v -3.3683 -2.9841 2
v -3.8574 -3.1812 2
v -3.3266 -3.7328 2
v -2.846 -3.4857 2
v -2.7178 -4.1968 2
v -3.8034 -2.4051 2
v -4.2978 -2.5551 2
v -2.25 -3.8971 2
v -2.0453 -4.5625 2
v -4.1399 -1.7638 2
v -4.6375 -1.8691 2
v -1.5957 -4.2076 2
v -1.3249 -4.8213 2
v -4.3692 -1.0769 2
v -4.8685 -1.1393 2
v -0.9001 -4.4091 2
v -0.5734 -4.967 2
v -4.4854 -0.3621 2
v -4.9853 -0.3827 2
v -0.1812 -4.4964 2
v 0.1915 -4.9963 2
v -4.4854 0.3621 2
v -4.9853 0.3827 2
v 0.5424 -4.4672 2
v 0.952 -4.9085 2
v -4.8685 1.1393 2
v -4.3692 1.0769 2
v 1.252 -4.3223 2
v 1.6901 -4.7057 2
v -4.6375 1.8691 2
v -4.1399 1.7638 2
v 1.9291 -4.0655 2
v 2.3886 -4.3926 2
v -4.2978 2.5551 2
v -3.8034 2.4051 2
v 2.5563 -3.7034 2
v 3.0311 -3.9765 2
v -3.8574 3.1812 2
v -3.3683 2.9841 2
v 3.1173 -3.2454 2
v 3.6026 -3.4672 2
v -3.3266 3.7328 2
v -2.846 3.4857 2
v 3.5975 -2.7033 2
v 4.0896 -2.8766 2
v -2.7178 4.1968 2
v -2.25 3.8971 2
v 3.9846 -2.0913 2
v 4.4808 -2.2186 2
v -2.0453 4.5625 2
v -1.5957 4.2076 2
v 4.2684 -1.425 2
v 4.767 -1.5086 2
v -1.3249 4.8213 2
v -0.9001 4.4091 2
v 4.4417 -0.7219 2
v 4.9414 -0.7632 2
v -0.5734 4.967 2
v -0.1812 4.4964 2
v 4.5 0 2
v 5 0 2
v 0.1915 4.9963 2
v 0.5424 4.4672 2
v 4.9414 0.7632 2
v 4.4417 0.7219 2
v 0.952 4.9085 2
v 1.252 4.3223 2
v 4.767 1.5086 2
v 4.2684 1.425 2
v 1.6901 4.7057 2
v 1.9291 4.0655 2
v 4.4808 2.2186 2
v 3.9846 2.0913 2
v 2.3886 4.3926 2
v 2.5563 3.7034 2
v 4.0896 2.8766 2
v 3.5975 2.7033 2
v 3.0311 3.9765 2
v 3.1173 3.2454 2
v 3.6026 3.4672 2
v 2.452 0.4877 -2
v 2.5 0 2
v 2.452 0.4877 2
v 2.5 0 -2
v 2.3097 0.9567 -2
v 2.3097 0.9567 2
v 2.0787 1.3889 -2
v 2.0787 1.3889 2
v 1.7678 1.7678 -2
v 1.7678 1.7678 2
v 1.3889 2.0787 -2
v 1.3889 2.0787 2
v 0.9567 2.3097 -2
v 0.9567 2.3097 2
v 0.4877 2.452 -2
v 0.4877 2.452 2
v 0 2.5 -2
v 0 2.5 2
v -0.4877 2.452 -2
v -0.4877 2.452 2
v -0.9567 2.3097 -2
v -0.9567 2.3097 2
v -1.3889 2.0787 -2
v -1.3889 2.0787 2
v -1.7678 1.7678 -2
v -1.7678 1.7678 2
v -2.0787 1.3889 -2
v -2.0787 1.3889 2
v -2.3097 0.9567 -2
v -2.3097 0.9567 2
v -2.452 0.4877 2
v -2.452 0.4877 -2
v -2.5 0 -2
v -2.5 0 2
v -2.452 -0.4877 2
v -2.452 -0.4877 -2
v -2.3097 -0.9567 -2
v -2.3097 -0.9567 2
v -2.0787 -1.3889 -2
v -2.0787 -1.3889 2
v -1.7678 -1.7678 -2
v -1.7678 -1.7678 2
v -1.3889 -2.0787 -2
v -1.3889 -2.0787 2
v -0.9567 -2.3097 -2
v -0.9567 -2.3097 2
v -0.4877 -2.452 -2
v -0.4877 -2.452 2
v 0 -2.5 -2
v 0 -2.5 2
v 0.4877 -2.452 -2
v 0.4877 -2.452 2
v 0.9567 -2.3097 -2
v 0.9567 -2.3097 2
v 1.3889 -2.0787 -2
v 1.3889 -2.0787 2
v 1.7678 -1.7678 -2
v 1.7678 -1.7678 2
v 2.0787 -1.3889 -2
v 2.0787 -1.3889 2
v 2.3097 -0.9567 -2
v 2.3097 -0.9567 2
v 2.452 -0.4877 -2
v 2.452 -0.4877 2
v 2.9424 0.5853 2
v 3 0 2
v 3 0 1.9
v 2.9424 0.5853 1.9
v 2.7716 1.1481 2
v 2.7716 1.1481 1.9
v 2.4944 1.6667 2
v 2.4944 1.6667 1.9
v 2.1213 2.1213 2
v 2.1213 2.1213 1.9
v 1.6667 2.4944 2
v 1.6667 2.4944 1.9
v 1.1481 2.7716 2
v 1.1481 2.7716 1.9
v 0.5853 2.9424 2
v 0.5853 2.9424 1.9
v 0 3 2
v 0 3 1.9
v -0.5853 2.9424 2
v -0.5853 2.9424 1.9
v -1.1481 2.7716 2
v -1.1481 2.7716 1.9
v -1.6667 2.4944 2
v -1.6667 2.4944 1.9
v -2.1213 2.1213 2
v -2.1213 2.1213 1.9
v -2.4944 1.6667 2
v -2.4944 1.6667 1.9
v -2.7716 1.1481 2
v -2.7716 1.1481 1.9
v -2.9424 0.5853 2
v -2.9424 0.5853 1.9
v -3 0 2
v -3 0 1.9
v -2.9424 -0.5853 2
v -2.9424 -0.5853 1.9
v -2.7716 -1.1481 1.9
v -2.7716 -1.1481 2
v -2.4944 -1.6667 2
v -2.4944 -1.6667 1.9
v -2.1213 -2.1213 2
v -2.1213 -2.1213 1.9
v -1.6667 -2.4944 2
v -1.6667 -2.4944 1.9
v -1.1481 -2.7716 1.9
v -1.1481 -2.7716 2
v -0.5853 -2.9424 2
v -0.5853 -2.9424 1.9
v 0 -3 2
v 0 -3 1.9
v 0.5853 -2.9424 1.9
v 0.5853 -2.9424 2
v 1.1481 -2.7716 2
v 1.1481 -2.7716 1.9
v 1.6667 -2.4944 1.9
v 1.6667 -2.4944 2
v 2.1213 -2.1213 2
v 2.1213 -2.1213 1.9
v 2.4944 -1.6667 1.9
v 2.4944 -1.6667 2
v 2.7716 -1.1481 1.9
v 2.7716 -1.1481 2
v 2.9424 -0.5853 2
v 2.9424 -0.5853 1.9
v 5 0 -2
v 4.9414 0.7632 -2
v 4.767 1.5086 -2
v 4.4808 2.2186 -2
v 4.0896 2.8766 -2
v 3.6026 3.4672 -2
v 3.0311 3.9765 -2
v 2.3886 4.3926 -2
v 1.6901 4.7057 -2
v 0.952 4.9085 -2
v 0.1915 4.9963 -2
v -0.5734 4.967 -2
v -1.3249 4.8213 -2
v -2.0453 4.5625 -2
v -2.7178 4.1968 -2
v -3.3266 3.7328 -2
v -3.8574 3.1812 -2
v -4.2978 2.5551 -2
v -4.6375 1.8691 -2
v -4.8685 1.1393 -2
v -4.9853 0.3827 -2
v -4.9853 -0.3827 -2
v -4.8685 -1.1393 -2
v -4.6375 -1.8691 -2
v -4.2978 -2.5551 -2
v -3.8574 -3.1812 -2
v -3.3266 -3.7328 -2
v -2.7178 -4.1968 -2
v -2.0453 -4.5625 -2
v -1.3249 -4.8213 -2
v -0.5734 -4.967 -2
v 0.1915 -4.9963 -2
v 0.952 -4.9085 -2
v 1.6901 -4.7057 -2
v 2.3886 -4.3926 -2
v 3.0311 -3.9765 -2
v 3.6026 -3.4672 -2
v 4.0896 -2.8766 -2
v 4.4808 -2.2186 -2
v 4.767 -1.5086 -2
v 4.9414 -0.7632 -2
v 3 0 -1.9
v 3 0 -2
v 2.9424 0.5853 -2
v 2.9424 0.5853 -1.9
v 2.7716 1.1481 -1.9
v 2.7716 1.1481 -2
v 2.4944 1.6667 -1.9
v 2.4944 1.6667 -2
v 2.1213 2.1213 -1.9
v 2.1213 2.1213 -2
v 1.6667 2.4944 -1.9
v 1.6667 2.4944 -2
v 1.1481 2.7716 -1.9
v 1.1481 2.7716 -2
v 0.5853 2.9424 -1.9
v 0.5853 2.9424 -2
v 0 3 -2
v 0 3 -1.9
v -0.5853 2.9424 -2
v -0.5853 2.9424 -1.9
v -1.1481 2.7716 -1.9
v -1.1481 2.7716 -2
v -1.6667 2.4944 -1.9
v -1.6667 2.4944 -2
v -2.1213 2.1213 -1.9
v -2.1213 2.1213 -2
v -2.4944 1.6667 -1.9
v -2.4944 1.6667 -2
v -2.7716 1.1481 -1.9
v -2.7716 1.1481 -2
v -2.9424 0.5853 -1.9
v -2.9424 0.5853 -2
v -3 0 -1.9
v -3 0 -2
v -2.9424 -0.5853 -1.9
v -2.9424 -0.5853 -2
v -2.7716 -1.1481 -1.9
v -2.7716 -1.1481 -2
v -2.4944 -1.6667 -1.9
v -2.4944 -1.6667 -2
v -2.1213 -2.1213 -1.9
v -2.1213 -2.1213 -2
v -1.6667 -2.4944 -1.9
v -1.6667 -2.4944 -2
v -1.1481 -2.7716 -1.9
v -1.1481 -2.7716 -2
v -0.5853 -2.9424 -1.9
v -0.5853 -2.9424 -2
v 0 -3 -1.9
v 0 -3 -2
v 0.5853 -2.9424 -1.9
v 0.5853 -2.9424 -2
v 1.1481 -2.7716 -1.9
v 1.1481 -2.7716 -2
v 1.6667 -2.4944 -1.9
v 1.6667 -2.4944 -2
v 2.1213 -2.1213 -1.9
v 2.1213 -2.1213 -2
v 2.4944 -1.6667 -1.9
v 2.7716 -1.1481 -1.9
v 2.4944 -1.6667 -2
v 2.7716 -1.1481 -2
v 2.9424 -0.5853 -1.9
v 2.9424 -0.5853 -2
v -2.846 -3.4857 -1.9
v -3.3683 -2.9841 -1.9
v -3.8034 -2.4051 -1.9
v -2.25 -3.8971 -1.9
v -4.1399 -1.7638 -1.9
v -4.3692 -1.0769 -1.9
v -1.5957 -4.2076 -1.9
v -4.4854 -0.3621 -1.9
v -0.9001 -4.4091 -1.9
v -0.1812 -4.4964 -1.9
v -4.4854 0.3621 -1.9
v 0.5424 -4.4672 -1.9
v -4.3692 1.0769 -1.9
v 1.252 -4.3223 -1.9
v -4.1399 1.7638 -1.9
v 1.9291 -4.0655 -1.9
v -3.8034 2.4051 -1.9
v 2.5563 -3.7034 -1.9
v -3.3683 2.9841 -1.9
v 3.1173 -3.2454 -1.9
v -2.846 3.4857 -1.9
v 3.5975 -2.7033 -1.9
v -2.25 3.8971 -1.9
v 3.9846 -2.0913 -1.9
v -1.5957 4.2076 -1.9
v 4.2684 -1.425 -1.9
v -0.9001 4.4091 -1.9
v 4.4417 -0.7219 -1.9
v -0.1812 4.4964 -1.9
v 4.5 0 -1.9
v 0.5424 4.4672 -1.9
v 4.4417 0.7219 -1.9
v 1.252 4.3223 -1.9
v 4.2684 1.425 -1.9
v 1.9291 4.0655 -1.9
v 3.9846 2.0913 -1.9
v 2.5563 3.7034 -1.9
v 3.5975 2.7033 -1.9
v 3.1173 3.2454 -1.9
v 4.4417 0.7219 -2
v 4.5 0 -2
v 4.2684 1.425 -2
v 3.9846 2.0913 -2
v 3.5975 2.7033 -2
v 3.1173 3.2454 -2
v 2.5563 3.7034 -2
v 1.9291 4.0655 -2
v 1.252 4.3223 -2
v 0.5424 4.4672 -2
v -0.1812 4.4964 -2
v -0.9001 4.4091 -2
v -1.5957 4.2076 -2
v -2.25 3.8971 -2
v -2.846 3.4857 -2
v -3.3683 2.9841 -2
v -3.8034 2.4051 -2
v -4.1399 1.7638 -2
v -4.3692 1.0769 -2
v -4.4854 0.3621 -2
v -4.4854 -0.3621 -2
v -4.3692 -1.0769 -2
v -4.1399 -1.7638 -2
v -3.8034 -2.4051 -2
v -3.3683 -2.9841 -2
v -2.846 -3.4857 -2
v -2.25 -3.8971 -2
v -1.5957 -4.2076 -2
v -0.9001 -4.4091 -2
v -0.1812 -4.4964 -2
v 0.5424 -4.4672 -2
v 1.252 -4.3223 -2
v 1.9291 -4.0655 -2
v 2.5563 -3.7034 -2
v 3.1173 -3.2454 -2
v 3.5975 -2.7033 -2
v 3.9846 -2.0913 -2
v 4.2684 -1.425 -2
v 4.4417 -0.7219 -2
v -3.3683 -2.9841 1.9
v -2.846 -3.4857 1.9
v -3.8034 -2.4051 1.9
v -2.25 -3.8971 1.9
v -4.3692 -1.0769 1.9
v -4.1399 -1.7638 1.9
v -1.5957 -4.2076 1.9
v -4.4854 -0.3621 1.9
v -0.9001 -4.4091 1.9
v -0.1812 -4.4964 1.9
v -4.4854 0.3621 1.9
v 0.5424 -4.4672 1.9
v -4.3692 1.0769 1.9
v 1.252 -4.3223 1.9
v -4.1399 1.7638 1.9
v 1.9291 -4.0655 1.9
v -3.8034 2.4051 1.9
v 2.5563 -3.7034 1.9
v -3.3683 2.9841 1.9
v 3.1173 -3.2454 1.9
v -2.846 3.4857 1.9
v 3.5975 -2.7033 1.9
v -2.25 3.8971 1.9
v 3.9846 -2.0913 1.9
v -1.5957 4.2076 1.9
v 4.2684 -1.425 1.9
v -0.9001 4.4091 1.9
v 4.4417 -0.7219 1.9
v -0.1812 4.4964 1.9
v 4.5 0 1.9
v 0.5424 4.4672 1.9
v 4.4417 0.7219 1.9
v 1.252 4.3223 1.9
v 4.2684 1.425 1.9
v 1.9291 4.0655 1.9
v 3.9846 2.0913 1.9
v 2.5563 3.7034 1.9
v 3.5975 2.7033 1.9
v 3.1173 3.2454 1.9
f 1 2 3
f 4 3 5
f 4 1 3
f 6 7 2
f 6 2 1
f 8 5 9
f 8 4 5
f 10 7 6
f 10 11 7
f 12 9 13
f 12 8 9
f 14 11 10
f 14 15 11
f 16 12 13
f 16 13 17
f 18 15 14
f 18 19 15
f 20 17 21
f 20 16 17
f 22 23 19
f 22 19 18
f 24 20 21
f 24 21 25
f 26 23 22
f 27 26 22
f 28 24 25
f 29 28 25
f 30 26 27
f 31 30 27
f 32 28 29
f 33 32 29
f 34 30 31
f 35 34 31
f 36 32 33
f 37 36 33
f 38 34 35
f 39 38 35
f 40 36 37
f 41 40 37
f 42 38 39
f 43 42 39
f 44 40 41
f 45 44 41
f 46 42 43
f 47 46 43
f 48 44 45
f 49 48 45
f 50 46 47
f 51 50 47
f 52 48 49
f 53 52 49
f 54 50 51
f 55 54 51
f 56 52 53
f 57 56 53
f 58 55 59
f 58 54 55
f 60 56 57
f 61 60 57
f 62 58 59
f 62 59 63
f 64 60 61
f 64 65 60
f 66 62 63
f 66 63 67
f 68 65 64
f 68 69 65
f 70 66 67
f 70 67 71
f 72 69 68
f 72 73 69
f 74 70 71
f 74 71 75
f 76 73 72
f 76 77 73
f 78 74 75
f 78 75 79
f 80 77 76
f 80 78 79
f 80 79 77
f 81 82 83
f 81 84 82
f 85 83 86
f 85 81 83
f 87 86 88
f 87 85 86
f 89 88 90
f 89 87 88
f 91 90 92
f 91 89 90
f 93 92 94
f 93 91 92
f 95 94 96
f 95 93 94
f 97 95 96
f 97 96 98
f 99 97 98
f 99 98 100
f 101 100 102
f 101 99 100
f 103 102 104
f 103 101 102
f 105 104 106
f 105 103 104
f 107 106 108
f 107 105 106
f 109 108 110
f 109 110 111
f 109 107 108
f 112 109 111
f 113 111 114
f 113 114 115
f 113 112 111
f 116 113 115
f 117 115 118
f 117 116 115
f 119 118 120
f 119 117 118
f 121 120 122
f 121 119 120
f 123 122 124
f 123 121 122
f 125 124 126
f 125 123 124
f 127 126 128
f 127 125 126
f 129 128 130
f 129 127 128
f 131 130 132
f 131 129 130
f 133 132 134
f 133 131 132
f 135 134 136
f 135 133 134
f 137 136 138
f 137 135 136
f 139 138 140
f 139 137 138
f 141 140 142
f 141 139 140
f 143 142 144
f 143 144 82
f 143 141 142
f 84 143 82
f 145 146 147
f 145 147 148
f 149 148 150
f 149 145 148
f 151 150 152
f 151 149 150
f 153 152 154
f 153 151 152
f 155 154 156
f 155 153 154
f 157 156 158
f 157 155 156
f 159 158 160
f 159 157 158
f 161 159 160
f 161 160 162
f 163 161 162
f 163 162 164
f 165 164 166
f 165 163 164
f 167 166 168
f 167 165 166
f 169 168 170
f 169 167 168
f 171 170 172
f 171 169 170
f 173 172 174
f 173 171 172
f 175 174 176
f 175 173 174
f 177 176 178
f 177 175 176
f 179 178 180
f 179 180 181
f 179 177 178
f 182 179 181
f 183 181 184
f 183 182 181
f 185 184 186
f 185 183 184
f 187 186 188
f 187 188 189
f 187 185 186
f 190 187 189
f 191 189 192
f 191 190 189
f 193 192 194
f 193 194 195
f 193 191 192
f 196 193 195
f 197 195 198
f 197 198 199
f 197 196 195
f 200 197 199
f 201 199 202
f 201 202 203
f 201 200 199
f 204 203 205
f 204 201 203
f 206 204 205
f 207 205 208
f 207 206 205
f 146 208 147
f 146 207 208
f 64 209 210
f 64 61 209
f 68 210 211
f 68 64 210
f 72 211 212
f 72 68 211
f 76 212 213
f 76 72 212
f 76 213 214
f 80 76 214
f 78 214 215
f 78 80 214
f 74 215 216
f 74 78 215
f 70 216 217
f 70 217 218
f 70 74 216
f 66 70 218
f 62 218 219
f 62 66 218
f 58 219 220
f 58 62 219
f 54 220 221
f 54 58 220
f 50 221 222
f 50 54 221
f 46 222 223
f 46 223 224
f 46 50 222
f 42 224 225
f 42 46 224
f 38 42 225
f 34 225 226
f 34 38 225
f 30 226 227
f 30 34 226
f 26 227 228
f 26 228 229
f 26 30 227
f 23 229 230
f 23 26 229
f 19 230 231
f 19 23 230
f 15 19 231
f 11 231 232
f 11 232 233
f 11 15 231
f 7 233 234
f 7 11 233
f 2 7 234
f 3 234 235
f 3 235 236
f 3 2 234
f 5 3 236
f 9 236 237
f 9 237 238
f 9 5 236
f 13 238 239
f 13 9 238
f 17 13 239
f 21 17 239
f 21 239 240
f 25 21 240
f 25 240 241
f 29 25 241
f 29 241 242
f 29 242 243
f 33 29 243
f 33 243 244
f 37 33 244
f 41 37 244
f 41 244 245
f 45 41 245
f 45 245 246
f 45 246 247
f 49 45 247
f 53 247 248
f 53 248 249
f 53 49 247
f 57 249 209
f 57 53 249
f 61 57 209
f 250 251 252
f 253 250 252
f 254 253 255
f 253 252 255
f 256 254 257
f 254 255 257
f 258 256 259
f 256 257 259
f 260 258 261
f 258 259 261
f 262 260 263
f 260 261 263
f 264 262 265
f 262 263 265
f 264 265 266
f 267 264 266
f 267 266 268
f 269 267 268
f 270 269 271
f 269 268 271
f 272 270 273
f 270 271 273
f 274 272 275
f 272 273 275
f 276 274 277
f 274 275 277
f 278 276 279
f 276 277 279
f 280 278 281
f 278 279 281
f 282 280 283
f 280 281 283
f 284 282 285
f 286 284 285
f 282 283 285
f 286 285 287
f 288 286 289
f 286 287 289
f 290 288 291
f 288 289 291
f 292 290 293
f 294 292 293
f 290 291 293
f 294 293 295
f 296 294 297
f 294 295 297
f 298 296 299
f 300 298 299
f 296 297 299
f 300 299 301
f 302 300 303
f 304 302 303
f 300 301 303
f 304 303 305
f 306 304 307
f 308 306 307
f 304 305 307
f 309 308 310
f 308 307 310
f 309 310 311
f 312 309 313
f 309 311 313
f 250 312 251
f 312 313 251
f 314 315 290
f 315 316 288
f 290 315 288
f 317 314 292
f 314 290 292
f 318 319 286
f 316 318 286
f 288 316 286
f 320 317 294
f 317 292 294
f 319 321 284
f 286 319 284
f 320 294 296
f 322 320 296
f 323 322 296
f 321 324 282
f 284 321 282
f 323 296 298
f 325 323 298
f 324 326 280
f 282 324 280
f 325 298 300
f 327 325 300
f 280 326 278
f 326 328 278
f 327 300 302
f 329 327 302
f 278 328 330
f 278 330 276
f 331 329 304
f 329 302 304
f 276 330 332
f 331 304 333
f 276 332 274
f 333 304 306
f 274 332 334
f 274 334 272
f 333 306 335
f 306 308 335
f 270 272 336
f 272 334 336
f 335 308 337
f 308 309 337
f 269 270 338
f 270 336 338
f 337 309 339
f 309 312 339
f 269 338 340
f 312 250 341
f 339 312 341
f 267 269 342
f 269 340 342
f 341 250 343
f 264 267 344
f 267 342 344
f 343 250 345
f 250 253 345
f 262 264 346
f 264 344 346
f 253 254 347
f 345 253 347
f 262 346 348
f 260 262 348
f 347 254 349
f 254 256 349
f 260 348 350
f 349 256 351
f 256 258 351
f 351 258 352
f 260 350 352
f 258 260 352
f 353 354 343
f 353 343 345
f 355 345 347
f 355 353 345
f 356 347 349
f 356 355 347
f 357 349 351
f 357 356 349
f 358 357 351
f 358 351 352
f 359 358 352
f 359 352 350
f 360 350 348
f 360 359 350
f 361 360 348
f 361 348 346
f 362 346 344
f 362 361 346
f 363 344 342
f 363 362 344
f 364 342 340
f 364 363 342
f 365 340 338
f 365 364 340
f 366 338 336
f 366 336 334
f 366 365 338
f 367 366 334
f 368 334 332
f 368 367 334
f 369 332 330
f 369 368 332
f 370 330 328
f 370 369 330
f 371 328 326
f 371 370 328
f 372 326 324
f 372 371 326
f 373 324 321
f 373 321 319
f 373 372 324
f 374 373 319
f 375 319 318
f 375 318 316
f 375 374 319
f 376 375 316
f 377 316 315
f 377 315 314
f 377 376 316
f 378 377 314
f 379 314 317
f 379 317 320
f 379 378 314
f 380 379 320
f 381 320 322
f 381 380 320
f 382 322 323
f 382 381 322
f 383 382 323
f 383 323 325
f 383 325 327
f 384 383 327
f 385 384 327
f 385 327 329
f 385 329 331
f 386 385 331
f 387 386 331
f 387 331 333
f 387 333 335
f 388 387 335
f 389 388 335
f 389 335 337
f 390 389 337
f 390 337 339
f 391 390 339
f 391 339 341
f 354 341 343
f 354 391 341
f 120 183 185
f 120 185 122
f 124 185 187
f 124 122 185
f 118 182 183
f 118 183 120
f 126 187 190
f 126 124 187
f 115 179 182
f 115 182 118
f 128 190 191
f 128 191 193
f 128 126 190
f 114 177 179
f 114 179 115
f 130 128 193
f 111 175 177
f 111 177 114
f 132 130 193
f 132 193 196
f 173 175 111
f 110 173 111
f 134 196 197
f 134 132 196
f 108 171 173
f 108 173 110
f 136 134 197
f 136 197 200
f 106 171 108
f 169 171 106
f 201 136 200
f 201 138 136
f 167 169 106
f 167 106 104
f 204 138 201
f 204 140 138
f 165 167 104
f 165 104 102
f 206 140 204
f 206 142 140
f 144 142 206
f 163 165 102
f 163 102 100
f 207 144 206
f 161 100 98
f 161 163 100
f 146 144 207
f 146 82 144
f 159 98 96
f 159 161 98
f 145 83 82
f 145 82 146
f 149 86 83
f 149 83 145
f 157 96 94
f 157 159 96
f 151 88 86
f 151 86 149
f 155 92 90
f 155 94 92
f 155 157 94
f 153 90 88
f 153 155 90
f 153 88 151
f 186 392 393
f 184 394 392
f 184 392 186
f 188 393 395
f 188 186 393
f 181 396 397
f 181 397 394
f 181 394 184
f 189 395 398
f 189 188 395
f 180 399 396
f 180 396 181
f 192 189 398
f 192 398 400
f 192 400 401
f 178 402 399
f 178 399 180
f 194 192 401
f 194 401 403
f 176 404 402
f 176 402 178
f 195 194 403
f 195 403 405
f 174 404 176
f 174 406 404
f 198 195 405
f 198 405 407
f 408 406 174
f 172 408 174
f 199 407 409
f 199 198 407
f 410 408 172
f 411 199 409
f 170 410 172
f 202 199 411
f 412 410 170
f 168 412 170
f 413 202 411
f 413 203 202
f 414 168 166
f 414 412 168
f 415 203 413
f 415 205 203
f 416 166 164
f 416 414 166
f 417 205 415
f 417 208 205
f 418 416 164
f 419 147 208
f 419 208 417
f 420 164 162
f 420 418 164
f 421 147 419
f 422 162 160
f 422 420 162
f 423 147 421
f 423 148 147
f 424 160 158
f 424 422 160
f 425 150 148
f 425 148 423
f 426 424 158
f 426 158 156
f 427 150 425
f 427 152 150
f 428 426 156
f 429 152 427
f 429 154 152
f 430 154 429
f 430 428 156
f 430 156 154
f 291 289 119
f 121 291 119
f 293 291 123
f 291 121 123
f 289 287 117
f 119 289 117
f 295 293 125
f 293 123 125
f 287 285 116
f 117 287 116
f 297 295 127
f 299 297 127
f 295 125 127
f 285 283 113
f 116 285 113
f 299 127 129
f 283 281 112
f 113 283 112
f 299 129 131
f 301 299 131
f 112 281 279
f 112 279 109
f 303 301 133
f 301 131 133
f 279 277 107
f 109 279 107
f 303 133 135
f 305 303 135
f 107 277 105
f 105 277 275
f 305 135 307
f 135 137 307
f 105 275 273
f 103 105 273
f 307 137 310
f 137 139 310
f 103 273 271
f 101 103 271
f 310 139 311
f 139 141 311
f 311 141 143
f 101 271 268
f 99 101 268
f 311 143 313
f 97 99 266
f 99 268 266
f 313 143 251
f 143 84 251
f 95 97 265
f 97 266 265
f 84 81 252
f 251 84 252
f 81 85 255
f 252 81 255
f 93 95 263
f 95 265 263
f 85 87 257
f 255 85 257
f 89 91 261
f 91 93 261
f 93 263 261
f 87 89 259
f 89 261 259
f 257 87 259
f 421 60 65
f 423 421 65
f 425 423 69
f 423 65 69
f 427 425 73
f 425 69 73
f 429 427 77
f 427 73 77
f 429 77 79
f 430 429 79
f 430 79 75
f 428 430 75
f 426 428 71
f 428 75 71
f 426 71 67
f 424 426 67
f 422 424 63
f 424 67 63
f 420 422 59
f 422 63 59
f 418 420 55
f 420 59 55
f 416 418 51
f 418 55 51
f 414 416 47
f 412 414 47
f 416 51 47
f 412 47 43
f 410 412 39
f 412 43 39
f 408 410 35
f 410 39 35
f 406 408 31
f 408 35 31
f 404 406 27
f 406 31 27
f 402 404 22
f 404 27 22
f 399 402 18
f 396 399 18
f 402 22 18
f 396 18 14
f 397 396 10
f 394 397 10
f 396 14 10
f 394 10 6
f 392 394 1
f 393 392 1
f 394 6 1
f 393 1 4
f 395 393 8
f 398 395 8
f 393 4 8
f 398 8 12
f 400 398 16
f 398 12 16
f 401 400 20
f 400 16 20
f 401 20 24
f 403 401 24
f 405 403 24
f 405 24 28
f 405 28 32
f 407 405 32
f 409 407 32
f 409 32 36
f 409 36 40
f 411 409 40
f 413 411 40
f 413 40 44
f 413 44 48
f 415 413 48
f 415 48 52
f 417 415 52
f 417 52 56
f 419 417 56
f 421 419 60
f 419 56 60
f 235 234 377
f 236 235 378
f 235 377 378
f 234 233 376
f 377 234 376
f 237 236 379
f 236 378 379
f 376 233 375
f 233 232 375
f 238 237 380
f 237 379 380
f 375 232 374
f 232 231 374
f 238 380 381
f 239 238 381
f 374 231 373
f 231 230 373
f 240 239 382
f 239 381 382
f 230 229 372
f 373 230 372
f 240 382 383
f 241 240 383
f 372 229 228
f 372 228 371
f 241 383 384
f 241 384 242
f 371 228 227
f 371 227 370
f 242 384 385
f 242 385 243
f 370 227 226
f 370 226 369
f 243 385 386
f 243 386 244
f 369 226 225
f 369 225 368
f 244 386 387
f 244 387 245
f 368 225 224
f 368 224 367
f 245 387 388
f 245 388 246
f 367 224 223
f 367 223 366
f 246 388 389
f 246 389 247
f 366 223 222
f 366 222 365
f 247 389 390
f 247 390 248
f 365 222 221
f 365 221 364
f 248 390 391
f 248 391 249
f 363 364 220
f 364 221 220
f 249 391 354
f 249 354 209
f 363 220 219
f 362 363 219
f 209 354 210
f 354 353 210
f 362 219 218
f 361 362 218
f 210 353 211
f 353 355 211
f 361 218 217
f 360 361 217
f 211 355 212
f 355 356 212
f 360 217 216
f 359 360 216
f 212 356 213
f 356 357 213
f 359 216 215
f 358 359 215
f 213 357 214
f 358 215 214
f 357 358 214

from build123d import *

# Parameters (mm, degrees)
SKETCH1_R           = 5
SKETCH1_R_2         = 2.5
BOSS_EXTRUDE1_DEPTH = 2
SKETCH2_R           = 4.5
SKETCH2_R_2         = 3
CUT_EXTRUDE1_DEPTH  = 0.1


with BuildPart() as part:
    # Sketch1 → Boss-Extrude1 (new, symmetric)
    with BuildSketch(Plane.XY):
        Circle(SKETCH1_R)
        Circle(SKETCH1_R_2, mode=Mode.SUBTRACT)
    extrude(amount=BOSS_EXTRUDE1_DEPTH, both=True)

    # Sketch2 → Cut-Extrude1 (cut)
    with BuildSketch(Plane.XY.offset(2)):
        Circle(SKETCH2_R)
        Circle(SKETCH2_R_2, mode=Mode.SUBTRACT)
    cut_extrude1 = extrude(amount=-CUT_EXTRUDE1_DEPTH, mode=Mode.SUBTRACT)

    # Mirror1: Cut-Extrude1 across plane
    add(cut_extrude1.mirror(Plane.XY), mode=Mode.SUBTRACT)


solid = part.part
